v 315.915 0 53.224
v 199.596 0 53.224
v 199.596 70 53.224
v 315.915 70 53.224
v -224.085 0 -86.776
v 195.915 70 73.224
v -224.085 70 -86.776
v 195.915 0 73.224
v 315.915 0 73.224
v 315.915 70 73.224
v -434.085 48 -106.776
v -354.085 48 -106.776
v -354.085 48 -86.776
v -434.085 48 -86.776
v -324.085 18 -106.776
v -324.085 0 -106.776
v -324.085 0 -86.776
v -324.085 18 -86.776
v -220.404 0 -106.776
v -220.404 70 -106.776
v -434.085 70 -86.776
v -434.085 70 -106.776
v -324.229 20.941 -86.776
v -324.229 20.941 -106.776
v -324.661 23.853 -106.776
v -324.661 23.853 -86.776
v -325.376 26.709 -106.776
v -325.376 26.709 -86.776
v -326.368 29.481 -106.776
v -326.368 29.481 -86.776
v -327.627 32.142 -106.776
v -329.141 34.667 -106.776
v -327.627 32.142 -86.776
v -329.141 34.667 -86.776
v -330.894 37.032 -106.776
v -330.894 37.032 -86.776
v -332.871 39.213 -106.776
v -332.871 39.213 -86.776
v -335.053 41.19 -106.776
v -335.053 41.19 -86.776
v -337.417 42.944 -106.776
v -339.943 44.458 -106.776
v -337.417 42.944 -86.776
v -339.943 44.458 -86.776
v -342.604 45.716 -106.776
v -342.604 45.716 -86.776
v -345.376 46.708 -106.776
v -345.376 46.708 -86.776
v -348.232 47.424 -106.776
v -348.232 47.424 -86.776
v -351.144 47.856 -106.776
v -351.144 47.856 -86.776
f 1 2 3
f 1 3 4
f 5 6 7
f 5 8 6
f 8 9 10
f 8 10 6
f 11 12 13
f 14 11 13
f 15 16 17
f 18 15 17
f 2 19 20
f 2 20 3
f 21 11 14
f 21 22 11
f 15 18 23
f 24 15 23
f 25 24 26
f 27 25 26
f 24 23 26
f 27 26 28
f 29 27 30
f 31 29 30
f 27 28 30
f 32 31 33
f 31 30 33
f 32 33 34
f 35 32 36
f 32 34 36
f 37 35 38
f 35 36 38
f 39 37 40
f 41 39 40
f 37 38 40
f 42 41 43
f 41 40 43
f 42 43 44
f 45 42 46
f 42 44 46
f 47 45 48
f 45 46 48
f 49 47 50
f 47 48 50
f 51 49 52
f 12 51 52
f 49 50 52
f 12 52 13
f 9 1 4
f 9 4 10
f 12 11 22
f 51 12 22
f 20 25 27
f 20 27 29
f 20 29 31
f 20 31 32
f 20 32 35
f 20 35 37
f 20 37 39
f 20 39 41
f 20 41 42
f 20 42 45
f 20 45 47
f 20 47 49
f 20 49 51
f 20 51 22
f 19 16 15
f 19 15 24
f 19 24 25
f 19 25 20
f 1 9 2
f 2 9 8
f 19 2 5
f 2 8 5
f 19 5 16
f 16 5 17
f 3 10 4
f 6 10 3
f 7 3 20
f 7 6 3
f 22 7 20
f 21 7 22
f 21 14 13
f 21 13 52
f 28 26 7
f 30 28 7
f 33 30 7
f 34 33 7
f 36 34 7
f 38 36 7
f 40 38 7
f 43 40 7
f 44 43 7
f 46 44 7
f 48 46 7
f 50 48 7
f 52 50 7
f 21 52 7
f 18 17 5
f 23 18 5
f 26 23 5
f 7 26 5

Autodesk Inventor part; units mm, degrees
ref_plane "YZ Plane" through (0, 0, 0) normal (1, 0, 0) x (0, 1, 0)
ref_plane "XZ Plane" through (0, 0, 0) normal (0, 1, 0) x (-1, 0, 0)
ref_plane "XY Plane" through (0, 0, 0) normal (0, 0, 1) x (1, 0, 0)
sketch "Sketch1" plane through (0, 0, 0) normal (0, 1, 0) x (-1, 0, 0)
  line L0 (-315.9154, 73.2239) -> (-195.9154, 73.2239)
  line L1 (-195.9154, 73.2239) -> (224.0846, -86.7761)
  line L2 (324.0846, -86.7761) -> (224.0846, -86.7761)
  line L3 (324.0846, -106.7761) -> (220.4041, -106.7761)
  line L4 (220.4041, -106.7761) -> (-199.5959, 53.2239)
  line L5 (-199.5959, 53.2239) -> (-315.9154, 53.2239)
  line L6 (324.0846, -106.7761) -> (324.0846, -86.7761)
  line L7 (-315.9154, 53.2239) -> (-315.9154, 73.2239)
  point P0 (0, 0)
  dimension "d2" = 100
  dimension "d3" = 449.4441
  dimension "d4" = 120
  dimension "d5" = 159.146
  dimension "d6" = 159.146
  dimension "d7" = 20
extrude "Extrusion1" add sketch "Sketch1" along normal blind 70
sketch "Sketch2" plane through (-324.0846, 0, -106.7761) normal (-1, 0, 0) x (0, 0, 1)
  line L0 (0, 48) -> (20, 48)
  line L1 (20, 48) -> (20, 70)
  line L2 (20, 70) -> (0, 70)
  line L3 (0, 70) -> (0, 48)
  point P0 (106.7761, 0)
extrude "Extrusion2" add sketch "Sketch2" along normal blind 110
fillet "Fillet1" radius 30 1 edges at (-324.0846, 48, -96.7761)
properties part number "Y_zigZag" material "Aluminum 6061"
